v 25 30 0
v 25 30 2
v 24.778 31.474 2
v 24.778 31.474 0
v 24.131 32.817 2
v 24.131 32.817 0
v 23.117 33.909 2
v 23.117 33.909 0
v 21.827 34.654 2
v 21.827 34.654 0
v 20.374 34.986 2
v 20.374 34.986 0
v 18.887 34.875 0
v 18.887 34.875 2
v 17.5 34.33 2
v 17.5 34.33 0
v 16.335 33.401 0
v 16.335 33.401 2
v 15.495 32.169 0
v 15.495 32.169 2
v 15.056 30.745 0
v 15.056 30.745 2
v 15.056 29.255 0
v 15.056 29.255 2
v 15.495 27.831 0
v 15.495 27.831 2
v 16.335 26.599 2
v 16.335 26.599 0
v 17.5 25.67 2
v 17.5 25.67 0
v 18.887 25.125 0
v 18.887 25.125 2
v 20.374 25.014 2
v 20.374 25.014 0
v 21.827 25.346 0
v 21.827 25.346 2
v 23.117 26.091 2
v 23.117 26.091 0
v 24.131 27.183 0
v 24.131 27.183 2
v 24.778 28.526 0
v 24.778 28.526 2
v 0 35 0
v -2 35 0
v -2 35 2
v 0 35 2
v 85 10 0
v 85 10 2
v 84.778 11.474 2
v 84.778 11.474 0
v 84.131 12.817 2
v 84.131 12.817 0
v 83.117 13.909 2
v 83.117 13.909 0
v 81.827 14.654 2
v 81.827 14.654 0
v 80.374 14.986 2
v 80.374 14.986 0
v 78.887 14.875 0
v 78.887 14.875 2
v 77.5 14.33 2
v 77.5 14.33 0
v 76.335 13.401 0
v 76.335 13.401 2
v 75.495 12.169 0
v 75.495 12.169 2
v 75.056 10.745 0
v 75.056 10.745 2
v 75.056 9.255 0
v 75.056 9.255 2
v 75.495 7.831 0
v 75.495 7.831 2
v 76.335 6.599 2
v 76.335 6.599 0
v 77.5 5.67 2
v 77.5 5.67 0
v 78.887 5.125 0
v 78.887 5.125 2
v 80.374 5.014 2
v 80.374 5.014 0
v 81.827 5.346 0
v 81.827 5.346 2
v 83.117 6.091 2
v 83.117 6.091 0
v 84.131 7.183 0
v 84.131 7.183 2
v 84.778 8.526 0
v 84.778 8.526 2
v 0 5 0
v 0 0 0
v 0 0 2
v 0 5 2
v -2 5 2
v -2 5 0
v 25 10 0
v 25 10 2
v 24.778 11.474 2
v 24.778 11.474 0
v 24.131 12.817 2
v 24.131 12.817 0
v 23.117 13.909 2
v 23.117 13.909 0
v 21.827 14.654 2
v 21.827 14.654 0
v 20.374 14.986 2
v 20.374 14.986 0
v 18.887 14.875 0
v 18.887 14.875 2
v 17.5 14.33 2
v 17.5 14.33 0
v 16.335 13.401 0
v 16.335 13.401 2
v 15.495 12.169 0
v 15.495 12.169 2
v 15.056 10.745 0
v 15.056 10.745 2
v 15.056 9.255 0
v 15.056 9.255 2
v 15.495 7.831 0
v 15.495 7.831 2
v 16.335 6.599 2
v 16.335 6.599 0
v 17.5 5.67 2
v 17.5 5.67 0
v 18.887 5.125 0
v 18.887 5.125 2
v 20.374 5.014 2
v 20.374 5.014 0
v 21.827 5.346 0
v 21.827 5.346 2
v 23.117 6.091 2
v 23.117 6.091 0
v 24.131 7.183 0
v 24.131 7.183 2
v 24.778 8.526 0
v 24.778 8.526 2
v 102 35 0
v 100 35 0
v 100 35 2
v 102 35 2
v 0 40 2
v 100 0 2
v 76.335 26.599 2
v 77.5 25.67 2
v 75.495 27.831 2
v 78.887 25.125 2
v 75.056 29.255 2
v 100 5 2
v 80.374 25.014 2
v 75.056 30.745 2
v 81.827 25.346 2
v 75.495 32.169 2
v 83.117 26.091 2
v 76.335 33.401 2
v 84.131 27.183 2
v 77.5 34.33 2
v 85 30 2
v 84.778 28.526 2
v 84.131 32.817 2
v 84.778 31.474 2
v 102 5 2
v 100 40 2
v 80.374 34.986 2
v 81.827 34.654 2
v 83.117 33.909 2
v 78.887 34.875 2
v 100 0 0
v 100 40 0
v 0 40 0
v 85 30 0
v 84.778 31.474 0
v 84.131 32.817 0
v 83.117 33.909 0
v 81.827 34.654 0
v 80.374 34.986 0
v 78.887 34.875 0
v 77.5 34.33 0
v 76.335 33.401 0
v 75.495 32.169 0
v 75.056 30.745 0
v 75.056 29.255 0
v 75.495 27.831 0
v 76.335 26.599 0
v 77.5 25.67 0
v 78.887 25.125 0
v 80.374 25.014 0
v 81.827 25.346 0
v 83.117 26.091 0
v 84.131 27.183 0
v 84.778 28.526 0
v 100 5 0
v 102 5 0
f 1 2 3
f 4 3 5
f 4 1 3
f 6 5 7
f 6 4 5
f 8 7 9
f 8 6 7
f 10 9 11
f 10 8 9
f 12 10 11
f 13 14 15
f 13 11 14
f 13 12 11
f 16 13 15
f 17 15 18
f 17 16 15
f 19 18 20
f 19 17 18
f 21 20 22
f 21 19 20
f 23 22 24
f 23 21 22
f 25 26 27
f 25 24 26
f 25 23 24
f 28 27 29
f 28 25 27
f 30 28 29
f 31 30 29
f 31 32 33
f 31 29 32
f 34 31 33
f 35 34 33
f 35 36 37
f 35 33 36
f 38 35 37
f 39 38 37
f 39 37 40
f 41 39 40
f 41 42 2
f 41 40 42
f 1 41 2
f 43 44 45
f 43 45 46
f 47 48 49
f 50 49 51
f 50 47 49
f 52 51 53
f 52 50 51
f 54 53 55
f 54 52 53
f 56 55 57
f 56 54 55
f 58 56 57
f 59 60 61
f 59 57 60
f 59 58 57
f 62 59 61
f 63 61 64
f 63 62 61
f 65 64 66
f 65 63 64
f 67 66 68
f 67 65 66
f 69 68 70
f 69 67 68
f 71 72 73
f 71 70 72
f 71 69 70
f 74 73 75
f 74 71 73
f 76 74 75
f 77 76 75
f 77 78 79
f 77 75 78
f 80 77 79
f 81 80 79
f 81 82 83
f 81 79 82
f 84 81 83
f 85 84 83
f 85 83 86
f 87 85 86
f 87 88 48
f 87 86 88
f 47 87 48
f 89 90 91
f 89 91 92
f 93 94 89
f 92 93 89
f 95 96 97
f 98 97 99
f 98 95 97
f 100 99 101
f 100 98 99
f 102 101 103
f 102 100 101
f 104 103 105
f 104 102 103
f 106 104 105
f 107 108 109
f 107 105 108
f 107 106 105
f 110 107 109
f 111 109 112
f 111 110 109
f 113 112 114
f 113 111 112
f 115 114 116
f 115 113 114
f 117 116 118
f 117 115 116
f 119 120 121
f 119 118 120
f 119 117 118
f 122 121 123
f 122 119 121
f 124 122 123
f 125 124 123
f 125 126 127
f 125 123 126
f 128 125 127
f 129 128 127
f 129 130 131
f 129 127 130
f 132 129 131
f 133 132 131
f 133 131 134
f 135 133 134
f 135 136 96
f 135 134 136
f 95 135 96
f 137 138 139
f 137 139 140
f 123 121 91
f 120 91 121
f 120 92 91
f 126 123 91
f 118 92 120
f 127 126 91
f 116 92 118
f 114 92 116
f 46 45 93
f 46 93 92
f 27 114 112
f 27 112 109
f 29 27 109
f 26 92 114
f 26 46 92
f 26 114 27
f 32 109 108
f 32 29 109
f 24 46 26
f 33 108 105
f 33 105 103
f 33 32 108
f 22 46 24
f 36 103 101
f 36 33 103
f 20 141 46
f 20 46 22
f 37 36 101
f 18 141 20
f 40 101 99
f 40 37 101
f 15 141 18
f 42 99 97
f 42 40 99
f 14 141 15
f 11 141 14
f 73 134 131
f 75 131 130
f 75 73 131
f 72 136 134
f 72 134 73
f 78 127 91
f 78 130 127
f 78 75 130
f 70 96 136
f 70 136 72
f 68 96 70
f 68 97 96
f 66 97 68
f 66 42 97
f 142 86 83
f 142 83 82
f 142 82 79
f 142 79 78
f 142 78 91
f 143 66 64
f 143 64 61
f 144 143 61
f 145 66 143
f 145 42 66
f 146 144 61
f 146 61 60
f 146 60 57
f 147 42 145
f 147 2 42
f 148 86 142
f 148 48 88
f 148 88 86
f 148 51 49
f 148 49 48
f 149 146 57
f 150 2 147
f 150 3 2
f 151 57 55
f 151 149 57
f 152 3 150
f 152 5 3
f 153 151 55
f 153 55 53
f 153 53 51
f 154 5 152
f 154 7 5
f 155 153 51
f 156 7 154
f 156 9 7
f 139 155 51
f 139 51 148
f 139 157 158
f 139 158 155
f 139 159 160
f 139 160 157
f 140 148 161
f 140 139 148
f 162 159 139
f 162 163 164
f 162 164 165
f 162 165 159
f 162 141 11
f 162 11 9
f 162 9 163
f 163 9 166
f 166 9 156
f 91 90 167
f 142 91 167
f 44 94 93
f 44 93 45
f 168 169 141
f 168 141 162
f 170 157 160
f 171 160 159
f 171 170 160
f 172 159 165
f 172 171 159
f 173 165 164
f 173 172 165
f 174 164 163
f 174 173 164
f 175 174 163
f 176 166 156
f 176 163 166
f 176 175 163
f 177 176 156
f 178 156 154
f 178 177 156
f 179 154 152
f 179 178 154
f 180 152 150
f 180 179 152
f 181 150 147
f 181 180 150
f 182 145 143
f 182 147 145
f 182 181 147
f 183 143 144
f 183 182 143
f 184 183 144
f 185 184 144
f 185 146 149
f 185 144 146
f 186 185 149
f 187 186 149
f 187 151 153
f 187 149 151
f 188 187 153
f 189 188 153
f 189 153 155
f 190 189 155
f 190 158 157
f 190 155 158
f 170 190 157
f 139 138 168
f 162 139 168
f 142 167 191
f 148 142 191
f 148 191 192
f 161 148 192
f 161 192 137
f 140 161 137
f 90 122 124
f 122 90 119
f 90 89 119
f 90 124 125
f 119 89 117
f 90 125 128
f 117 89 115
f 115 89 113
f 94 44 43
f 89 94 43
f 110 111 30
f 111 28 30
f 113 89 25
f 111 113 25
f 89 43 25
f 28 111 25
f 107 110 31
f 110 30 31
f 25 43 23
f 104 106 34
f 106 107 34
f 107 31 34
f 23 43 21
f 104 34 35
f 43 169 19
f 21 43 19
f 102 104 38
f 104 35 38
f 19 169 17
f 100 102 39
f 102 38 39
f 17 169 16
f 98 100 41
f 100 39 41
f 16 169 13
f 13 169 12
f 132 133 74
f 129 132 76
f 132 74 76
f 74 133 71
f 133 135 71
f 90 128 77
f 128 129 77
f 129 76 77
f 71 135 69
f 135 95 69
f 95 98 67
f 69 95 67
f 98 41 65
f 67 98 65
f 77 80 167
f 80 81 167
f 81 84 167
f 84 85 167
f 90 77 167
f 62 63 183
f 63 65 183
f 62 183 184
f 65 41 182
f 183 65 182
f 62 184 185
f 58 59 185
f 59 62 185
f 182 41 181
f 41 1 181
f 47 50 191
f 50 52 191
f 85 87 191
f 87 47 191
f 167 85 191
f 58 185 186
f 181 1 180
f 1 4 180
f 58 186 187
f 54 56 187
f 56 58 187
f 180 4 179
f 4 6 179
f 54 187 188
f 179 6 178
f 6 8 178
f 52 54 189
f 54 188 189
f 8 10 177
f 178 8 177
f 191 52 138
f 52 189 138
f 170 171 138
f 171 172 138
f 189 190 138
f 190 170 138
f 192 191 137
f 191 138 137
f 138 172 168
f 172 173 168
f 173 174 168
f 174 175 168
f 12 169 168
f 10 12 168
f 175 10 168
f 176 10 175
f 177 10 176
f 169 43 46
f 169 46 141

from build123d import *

# Parameters (mm, degrees)
SKETCH_1_W          = 2
SKETCH_1_H          = 30
SKETCH_1_W_2        = 100
SKETCH_1_H_2        = 40
EXTRUDE_1_DEPTH     = 2
SKETCH_2_R          = 5
CUT_EXTRUDE_1_DEPTH = 110.581020254


with BuildPart() as part:
    # 草图1 → 凸台-拉伸1 (new body)
    with BuildSketch(Plane.XY):
        with Locations((-1, 20)):
            Rectangle(SKETCH_1_W, SKETCH_1_H)
        with Locations((50, 20)):
            Rectangle(SKETCH_1_W_2, SKETCH_1_H_2)
        with Locations((101, 20)):
            Rectangle(SKETCH_1_W, SKETCH_1_H)
    extrude(amount=EXTRUDE_1_DEPTH)

    # 草图2 → 切除-拉伸1 (cut, through all)
    with BuildSketch(Plane.XY):
        with Locations((20, 30)):
            Circle(SKETCH_2_R)
        with Locations((80, 30)):
            Circle(SKETCH_2_R)
        with Locations((80, 10)):
            Circle(SKETCH_2_R)
        with Locations((20, 10)):
            Circle(SKETCH_2_R)
    extrude(amount=CUT_EXTRUDE_1_DEPTH, mode=Mode.SUBTRACT)


solid = part.part
